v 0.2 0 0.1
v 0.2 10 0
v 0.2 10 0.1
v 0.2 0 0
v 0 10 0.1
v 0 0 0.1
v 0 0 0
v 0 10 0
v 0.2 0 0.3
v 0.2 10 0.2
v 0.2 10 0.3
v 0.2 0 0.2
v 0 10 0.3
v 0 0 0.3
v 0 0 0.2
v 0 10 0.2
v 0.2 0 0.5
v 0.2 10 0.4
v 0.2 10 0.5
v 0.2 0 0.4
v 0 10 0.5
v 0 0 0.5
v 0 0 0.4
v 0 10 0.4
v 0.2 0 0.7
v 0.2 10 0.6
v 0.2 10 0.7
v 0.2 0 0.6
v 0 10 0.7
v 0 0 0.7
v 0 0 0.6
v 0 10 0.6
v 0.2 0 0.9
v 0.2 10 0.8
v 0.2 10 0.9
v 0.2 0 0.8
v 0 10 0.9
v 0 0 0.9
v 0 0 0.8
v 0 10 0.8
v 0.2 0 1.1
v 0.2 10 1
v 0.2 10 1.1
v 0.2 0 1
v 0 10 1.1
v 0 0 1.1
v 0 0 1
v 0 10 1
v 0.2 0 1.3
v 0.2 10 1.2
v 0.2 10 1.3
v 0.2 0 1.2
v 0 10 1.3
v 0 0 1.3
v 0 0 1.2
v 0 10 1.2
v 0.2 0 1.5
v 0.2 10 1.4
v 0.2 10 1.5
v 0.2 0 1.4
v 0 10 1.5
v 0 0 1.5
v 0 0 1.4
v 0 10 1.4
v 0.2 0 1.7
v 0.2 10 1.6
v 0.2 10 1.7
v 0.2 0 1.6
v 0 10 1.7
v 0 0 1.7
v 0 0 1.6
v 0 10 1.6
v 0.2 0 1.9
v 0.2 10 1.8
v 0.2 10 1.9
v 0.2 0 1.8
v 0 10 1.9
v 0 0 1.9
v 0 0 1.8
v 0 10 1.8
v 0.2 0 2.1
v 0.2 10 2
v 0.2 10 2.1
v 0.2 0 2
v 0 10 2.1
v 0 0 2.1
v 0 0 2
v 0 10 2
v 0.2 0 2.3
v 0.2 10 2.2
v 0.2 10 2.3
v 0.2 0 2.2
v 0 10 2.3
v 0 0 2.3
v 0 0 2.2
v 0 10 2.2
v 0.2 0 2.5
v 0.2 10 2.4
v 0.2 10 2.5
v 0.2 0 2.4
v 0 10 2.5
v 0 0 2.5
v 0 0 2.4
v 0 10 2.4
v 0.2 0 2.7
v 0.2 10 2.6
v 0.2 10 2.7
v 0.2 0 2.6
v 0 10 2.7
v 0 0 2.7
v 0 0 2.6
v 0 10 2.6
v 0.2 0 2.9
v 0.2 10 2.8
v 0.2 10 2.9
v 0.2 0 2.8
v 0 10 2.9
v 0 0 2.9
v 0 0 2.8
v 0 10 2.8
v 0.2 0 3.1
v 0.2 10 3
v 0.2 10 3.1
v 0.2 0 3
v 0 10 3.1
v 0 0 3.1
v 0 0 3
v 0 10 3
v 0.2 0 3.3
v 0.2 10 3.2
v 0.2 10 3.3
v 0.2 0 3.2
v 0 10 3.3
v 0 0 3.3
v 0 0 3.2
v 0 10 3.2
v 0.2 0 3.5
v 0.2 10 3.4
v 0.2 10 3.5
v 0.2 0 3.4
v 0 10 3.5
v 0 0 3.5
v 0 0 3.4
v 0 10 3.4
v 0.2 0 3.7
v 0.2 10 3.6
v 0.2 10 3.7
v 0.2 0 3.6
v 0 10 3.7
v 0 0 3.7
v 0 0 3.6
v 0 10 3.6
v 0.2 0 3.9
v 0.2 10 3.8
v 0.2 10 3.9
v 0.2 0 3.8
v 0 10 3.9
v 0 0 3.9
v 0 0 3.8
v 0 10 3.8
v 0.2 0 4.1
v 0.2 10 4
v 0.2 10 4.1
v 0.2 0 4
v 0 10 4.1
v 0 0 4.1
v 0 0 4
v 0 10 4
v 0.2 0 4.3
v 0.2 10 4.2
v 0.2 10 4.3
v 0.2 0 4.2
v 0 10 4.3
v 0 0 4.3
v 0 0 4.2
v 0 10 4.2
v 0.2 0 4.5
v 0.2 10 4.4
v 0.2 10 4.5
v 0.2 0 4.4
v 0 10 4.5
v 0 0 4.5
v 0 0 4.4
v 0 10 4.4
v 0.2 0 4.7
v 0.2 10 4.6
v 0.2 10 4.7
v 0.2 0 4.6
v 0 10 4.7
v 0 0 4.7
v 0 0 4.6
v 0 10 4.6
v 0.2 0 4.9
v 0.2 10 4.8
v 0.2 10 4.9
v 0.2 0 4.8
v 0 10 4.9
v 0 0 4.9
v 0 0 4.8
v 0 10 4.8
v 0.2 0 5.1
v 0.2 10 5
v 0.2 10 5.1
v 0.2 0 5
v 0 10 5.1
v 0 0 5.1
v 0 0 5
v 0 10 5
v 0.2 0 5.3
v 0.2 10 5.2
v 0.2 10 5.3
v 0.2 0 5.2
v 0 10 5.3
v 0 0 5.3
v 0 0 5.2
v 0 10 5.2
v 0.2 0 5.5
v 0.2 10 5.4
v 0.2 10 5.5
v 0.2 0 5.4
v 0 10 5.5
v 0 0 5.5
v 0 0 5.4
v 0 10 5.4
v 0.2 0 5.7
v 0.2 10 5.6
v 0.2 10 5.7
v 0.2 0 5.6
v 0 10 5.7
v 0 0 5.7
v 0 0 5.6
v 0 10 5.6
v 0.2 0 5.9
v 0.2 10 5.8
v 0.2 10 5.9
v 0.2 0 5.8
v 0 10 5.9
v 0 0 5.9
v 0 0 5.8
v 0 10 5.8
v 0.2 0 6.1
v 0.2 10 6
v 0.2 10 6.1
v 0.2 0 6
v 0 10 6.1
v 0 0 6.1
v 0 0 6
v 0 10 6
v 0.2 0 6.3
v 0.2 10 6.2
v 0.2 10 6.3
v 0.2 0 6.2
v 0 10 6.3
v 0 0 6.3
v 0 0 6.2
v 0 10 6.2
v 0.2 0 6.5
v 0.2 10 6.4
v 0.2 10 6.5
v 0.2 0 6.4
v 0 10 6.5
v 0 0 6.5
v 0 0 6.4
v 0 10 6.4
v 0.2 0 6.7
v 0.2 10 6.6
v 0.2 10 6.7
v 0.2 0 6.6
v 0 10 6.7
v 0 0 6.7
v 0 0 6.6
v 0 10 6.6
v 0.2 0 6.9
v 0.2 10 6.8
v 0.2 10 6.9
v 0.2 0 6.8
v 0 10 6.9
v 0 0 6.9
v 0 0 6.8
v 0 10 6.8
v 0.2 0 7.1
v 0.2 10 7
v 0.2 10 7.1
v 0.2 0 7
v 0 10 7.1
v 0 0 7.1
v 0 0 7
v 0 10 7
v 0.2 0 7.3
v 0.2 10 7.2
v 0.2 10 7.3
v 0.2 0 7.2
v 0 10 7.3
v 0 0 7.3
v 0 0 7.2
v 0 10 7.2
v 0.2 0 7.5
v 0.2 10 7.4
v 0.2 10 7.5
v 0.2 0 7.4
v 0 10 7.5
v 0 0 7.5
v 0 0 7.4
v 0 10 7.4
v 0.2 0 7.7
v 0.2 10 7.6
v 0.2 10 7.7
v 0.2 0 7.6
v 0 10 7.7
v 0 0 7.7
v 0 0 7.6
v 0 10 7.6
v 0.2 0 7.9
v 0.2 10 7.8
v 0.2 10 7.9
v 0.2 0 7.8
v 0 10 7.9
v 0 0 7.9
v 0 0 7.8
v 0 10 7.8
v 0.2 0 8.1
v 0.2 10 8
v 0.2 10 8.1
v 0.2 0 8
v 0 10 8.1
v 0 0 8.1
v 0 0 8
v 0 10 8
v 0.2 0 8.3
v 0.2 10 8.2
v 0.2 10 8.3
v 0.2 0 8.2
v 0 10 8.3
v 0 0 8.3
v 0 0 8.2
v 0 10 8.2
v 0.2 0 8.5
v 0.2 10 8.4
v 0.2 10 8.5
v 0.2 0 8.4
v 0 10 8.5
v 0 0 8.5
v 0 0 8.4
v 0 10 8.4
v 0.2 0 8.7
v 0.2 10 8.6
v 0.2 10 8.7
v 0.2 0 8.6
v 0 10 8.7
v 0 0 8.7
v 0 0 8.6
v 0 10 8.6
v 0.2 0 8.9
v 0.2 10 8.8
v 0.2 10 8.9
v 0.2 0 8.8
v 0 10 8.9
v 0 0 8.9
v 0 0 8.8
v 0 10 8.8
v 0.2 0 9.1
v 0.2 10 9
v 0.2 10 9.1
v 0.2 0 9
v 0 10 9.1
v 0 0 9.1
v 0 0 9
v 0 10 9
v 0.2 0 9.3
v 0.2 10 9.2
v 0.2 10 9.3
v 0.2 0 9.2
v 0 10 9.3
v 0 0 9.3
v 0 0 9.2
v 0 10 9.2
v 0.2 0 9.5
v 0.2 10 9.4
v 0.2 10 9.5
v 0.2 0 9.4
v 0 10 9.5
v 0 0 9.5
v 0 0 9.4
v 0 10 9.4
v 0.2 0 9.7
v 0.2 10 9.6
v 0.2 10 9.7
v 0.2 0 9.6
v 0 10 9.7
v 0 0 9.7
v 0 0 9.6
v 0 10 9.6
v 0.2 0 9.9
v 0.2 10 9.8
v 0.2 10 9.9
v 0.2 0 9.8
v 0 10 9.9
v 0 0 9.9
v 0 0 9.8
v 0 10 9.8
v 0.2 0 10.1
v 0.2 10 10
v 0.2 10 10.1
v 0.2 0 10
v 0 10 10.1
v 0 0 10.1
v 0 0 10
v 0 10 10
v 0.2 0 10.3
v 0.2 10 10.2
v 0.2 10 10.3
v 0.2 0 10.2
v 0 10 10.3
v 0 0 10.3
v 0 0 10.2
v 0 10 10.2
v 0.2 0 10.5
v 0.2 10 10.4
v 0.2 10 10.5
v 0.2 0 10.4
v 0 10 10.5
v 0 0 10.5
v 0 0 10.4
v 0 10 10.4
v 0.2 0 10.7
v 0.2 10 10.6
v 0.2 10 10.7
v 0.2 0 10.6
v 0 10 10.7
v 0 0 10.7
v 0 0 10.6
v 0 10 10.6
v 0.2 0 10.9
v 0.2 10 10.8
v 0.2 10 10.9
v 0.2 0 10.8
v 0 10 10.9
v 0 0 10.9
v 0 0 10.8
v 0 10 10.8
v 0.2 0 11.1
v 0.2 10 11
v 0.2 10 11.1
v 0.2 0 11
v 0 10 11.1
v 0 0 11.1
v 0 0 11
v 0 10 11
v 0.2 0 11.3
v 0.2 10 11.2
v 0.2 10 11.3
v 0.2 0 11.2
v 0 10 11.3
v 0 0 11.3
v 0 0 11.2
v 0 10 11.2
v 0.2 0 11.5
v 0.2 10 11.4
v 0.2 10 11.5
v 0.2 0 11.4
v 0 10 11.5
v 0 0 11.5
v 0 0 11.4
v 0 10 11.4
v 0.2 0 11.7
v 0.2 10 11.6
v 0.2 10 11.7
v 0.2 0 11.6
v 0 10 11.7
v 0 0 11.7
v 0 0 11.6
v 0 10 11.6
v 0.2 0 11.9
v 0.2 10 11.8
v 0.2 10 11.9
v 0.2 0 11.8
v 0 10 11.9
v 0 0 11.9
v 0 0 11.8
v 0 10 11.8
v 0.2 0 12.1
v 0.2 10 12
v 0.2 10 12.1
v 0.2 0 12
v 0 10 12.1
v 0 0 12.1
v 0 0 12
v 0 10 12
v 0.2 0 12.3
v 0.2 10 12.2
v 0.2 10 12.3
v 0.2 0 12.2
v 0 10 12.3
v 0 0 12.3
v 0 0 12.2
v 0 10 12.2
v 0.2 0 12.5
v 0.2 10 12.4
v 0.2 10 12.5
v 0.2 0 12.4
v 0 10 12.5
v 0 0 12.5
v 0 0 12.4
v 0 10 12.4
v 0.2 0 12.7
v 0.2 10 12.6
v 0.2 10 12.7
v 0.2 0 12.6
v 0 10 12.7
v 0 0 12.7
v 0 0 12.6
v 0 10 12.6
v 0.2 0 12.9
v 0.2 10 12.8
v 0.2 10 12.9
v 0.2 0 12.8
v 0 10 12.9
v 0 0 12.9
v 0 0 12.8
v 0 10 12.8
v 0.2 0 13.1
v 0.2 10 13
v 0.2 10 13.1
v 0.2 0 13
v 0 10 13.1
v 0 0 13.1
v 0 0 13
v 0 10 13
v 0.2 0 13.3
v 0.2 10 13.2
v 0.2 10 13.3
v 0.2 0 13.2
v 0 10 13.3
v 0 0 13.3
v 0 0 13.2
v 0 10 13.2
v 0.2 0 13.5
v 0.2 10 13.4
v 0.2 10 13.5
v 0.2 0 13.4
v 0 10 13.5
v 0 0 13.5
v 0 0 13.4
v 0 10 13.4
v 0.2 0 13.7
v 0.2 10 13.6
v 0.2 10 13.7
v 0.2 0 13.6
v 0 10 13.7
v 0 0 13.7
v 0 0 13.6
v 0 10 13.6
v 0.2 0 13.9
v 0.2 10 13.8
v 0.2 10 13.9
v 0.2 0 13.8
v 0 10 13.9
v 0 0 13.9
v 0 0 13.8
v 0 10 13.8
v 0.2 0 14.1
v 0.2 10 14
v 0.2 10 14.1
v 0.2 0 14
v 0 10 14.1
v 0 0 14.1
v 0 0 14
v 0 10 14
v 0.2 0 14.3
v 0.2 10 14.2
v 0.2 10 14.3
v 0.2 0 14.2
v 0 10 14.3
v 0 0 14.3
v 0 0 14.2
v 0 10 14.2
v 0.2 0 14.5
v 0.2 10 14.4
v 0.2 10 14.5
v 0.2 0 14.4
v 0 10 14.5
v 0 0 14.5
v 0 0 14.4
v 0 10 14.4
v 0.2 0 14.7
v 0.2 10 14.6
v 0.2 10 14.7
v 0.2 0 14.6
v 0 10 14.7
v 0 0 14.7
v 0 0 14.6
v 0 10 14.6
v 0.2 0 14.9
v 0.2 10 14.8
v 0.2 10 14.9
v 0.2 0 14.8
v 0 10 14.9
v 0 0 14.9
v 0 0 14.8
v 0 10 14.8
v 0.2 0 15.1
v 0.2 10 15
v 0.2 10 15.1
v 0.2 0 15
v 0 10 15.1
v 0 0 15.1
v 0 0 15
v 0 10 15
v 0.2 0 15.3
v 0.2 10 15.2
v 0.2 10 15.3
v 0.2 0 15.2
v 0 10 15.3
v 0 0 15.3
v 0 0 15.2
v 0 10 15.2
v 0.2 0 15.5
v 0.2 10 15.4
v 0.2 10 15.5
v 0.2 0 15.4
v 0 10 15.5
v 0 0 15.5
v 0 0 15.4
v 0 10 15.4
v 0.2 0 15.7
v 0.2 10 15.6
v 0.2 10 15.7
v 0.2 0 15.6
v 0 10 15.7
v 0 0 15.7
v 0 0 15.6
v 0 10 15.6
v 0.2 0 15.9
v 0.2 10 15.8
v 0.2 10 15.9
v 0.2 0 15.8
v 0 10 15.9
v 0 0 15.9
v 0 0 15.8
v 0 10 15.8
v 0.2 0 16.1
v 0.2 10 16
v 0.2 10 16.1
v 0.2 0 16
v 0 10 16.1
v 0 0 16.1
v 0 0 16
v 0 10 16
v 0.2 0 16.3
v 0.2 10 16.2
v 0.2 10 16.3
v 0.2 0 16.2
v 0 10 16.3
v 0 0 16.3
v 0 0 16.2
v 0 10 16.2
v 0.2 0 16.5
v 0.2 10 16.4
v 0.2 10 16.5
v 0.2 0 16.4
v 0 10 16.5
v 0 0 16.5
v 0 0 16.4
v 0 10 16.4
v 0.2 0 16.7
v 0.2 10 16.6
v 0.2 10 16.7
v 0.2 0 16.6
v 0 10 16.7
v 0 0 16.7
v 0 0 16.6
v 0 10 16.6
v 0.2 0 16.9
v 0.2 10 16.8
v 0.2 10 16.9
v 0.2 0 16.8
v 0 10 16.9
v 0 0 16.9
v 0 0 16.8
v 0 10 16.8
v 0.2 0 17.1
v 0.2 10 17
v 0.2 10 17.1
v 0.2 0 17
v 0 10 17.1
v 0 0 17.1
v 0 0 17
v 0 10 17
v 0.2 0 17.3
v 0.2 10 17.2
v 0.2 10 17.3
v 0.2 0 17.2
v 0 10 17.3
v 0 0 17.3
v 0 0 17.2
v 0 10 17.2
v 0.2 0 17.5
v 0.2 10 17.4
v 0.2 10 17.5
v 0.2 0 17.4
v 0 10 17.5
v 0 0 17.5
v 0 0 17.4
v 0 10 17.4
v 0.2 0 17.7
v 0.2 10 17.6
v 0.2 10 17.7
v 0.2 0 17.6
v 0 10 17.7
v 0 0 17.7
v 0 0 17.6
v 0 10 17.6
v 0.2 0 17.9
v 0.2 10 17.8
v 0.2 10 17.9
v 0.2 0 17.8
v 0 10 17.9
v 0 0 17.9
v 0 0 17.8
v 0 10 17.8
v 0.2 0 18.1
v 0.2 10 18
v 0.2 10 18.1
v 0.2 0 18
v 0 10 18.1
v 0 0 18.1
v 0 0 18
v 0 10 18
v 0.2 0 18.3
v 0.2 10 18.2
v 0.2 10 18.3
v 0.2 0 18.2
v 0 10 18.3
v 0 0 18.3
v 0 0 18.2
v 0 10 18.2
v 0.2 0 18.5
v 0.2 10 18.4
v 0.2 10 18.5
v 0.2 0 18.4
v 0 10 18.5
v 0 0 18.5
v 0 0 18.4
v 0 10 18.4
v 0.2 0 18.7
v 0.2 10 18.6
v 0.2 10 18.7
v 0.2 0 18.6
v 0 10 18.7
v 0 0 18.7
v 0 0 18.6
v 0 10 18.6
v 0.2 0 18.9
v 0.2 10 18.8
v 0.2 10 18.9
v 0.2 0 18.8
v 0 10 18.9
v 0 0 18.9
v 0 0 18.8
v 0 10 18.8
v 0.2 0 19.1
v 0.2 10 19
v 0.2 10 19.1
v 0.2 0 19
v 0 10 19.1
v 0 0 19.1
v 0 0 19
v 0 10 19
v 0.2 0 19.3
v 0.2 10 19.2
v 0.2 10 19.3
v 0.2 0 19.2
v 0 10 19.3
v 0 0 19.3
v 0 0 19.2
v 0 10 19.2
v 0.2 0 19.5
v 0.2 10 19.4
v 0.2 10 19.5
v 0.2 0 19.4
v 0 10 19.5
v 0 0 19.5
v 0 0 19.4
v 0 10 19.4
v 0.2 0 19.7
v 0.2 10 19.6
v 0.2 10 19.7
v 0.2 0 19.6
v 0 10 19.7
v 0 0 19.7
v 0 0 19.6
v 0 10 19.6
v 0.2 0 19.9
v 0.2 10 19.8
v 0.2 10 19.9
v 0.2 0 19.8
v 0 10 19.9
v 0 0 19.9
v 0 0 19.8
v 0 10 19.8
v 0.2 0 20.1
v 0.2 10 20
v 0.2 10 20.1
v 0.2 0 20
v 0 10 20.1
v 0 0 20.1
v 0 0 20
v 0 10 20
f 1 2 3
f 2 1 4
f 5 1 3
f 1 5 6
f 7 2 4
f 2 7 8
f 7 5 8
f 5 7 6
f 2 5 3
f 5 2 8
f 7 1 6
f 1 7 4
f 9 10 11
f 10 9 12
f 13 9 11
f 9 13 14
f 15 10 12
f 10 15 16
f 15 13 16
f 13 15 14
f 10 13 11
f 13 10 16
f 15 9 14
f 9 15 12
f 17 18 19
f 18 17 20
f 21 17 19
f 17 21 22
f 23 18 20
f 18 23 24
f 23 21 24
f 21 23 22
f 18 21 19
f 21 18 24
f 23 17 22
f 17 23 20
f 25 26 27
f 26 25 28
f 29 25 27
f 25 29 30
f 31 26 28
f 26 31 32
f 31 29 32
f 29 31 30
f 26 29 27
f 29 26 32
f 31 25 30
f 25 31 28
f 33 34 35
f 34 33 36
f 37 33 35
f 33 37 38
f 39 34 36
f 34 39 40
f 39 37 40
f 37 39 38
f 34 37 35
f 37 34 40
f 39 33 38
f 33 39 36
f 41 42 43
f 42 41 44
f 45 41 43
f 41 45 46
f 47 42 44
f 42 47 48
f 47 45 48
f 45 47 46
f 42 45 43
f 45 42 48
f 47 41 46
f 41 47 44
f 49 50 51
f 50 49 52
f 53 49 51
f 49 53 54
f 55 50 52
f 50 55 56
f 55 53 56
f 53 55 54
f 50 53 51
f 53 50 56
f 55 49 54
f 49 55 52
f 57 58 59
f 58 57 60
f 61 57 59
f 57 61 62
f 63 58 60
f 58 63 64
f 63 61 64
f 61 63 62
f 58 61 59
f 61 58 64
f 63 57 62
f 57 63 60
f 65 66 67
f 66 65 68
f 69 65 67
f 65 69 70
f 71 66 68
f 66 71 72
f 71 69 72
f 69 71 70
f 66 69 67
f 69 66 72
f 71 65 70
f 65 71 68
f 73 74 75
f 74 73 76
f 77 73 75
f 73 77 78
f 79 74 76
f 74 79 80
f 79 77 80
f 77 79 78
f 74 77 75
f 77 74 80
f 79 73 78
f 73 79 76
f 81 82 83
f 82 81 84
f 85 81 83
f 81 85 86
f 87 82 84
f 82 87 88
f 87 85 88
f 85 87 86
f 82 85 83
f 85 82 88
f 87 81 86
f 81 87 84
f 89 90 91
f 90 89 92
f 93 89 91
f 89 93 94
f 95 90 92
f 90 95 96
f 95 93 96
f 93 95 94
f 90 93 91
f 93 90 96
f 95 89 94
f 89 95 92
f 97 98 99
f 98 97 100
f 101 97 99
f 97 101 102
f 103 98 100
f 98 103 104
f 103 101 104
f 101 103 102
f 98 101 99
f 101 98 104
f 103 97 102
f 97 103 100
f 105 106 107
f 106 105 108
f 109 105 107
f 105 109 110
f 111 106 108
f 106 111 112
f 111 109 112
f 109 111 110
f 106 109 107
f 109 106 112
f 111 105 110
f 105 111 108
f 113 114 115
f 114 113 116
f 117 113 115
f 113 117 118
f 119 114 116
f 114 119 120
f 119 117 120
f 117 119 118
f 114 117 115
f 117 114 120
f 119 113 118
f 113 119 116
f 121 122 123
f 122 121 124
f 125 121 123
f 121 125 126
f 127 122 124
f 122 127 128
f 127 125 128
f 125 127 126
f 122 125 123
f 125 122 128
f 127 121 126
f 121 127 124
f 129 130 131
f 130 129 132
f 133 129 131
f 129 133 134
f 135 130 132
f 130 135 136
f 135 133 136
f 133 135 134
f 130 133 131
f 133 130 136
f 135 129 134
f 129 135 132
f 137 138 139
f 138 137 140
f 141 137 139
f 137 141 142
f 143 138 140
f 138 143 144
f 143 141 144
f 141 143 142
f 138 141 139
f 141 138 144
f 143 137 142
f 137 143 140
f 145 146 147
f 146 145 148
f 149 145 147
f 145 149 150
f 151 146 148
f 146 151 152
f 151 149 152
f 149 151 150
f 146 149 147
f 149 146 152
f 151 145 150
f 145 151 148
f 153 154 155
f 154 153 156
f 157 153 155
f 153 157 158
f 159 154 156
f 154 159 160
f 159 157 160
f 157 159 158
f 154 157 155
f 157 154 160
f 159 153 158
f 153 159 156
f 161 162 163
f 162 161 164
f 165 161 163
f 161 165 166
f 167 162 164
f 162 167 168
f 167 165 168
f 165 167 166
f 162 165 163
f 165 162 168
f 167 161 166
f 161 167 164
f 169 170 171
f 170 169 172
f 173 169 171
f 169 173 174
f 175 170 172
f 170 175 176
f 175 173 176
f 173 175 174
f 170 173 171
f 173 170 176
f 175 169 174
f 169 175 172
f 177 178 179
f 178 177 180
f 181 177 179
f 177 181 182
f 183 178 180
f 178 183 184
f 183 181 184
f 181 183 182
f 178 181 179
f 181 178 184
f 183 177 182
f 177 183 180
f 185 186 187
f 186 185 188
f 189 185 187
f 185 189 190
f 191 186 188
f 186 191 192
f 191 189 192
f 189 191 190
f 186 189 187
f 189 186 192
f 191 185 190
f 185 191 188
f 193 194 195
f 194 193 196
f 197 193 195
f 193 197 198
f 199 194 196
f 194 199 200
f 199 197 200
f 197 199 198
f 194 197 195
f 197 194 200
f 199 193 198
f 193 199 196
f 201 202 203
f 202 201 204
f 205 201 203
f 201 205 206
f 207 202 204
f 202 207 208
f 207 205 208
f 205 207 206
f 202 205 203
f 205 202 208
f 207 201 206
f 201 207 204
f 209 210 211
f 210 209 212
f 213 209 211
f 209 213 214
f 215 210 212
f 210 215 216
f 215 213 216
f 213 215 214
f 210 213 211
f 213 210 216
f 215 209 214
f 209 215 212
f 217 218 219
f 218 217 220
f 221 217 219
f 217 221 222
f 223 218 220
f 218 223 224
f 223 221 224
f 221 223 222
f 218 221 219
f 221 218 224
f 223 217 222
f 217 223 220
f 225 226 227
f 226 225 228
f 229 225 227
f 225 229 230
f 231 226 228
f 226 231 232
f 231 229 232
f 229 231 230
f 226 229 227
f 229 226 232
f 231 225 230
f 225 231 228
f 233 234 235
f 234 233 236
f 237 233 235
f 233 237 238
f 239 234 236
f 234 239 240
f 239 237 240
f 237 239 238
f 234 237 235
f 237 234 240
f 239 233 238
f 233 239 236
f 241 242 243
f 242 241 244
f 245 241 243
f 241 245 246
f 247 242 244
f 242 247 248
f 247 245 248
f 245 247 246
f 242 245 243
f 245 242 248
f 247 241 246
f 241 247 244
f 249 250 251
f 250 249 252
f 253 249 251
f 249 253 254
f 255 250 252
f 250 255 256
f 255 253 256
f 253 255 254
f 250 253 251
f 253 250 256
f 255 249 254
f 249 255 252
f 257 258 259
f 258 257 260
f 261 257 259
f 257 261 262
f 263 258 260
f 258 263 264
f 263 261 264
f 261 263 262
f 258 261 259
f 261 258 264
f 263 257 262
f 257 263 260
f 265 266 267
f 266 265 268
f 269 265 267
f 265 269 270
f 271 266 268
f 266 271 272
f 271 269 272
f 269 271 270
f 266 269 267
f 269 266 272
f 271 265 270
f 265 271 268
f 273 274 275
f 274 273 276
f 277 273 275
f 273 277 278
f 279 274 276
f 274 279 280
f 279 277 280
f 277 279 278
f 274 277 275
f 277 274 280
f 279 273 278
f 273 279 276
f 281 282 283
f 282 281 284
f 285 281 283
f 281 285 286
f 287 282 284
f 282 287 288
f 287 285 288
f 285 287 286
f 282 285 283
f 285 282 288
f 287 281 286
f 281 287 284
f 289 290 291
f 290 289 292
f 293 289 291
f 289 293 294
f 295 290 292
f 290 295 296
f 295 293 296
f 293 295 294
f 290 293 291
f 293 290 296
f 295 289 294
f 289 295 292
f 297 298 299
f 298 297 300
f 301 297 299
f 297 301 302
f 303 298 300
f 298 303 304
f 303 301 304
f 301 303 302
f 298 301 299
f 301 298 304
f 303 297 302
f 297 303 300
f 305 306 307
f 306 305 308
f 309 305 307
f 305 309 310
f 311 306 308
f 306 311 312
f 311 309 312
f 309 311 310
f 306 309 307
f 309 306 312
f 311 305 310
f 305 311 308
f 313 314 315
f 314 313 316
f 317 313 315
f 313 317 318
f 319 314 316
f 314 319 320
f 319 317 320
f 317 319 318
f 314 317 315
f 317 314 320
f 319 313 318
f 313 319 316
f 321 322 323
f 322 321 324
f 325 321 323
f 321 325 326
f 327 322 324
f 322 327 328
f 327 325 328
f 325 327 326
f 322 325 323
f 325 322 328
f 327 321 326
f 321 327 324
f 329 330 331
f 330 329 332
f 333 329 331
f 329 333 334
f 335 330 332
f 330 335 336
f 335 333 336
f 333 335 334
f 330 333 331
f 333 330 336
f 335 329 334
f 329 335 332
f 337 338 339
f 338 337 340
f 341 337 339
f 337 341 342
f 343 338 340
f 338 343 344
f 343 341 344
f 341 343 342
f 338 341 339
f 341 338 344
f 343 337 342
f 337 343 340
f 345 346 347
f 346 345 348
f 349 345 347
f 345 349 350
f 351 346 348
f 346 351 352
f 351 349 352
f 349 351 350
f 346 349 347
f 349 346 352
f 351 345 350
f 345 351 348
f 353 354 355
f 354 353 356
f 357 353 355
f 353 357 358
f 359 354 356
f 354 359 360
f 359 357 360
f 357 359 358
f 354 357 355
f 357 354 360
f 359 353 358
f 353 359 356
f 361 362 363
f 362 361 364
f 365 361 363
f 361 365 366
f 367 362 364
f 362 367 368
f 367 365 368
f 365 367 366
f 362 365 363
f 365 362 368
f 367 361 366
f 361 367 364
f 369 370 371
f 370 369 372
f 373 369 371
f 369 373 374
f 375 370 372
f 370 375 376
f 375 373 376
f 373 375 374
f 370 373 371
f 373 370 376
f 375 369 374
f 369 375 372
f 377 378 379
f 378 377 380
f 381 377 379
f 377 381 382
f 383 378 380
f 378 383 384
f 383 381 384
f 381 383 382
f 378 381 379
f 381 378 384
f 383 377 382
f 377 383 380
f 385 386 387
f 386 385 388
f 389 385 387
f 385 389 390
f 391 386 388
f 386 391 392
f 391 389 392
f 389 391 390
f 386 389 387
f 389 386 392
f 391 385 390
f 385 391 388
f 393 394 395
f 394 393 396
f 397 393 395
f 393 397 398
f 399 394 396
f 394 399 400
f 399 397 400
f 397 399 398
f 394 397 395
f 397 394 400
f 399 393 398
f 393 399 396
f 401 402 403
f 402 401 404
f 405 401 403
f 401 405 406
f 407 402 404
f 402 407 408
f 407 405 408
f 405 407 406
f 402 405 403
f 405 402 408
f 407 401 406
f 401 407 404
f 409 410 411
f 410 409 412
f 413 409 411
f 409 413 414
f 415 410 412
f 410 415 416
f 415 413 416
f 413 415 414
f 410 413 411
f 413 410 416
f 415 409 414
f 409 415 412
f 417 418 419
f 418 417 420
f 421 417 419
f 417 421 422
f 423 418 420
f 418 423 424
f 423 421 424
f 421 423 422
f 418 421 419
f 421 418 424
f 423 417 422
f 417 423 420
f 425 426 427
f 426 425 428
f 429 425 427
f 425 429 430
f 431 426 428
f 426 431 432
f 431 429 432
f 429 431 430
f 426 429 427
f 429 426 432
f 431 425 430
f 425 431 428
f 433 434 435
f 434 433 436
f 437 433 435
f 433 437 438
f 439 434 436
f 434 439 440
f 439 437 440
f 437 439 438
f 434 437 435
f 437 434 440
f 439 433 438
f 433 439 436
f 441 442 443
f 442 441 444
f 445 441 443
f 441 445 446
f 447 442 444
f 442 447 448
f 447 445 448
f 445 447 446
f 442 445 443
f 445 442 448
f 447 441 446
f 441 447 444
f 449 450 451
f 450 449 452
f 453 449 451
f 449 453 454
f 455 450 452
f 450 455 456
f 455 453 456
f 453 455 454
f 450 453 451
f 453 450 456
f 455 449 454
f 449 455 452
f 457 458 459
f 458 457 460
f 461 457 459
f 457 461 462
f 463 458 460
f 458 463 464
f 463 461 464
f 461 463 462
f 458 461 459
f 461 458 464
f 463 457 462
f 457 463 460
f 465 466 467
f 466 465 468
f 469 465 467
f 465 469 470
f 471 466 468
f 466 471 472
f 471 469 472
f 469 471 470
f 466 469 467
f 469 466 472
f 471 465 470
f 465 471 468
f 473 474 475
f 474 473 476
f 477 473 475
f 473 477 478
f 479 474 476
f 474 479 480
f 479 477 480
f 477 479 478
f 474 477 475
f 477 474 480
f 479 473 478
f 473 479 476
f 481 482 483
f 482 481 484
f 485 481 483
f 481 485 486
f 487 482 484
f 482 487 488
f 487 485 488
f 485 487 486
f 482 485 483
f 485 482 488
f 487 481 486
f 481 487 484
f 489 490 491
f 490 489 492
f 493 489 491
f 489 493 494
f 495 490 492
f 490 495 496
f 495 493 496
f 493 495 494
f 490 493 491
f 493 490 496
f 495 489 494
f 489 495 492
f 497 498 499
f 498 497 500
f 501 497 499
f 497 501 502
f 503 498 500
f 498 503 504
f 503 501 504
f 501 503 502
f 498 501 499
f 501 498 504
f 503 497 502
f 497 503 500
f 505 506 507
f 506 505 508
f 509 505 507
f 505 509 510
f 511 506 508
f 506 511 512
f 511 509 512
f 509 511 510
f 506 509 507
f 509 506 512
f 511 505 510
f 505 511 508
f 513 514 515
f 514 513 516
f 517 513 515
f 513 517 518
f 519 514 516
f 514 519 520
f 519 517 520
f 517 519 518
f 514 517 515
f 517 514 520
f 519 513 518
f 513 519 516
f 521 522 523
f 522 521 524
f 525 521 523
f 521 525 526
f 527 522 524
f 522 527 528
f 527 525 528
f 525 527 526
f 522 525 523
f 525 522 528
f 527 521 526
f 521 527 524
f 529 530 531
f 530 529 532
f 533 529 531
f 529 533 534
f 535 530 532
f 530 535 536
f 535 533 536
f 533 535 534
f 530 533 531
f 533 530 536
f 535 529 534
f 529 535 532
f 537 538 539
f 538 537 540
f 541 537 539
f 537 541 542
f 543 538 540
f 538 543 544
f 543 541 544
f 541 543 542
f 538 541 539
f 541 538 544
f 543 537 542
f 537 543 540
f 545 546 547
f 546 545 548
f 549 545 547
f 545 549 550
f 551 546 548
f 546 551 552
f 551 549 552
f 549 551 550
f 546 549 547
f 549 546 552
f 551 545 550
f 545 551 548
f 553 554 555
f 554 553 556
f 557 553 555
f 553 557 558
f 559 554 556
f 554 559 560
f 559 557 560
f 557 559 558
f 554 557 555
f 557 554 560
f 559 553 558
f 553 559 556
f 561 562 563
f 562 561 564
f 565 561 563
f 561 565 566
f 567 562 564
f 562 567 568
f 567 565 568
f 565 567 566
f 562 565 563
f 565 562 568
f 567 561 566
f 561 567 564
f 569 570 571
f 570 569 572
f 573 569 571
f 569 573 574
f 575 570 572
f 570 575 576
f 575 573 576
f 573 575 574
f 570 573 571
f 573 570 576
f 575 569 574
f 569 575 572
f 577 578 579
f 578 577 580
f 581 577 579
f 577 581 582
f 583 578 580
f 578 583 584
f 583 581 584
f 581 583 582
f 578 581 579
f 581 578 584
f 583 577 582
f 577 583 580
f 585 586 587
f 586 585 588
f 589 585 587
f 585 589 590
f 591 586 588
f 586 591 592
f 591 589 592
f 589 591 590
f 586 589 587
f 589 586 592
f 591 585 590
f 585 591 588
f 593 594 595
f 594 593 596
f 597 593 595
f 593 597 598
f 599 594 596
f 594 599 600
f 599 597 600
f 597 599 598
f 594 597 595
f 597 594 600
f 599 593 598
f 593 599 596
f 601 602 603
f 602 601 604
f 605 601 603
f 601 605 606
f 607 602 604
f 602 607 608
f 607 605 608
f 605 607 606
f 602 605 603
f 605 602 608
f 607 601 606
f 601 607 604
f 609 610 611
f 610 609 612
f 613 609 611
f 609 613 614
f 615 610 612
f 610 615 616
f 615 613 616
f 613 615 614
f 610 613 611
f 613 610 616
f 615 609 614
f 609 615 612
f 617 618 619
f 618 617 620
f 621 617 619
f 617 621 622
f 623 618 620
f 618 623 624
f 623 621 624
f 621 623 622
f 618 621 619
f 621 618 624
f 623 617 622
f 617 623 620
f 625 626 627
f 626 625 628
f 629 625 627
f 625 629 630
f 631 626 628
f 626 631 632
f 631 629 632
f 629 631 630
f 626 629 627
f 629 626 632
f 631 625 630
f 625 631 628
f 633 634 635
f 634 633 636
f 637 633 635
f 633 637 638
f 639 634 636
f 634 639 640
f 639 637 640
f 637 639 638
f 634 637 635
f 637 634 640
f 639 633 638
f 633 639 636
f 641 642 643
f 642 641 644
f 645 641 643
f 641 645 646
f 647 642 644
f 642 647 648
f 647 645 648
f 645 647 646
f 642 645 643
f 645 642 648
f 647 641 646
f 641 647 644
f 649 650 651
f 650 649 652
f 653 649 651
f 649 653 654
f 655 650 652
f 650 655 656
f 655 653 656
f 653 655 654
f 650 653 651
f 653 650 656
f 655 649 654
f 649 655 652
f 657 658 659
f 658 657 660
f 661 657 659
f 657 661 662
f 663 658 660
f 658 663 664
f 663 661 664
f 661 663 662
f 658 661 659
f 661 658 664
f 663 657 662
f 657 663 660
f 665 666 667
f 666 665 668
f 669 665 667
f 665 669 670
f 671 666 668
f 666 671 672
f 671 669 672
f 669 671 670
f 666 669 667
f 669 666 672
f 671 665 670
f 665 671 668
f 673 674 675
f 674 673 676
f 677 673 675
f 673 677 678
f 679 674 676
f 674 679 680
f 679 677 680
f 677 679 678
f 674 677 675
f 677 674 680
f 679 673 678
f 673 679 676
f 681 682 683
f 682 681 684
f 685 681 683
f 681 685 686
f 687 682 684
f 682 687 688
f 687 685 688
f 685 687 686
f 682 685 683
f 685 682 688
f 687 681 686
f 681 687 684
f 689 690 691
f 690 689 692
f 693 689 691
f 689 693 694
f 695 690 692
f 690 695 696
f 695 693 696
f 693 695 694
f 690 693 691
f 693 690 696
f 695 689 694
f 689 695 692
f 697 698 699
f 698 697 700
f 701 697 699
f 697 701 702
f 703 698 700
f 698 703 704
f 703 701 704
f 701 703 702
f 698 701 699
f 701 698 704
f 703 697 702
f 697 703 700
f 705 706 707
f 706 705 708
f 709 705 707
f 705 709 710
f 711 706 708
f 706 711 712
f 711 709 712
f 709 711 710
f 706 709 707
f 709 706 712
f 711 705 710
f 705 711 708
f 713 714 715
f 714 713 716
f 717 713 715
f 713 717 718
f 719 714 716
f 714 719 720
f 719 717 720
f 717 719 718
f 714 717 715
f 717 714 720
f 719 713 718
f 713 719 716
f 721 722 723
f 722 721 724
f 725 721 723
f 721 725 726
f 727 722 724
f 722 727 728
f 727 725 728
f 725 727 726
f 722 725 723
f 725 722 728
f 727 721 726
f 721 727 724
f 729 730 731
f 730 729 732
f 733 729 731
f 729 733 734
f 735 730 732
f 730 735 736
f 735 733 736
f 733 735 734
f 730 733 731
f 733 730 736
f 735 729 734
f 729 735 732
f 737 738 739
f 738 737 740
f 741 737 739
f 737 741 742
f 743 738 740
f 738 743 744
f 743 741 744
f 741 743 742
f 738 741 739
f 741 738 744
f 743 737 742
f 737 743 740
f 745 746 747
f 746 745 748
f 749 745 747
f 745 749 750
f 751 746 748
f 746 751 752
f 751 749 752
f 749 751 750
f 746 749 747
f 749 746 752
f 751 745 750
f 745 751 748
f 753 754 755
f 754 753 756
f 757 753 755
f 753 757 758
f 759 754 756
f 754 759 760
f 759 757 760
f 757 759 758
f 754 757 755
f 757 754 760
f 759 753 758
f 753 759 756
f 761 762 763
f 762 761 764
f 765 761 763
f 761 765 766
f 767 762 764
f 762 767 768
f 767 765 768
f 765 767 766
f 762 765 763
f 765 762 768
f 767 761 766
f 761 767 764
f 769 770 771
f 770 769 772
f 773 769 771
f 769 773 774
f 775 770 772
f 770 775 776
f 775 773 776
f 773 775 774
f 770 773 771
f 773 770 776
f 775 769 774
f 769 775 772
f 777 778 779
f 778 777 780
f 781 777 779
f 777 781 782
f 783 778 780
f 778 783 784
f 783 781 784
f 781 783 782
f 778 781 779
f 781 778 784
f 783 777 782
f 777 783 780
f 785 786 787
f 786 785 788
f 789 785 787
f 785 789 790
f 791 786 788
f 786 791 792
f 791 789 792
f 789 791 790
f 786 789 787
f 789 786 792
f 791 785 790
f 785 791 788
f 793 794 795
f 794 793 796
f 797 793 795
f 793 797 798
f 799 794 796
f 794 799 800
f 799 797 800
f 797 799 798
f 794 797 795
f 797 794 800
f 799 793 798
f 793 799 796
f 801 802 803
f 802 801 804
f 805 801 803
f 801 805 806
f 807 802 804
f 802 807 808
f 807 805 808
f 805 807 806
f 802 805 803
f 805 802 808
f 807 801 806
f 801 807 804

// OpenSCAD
LAYER_THICKNESS = 0.1;
WALL_THICKNESS = 0.2;

module support(WIDTH = 1, HEIGHT = 1) {
    STEPS_COUNT = ceil(HEIGHT / LAYER_THICKNESS * 2);
    SIZE_X = WALL_THICKNESS;
    SIZE_Y = WIDTH;
    SIZE_Z = LAYER_THICKNESS;
    for(I = [0:STEPS_COUNT]) {
        echo(I);
        translate([0, 0, I * LAYER_THICKNESS * 2])
        cube([SIZE_X, SIZE_Y, SIZE_Z]);
    }
}

support(WIDTH = 10, HEIGHT = 5);
